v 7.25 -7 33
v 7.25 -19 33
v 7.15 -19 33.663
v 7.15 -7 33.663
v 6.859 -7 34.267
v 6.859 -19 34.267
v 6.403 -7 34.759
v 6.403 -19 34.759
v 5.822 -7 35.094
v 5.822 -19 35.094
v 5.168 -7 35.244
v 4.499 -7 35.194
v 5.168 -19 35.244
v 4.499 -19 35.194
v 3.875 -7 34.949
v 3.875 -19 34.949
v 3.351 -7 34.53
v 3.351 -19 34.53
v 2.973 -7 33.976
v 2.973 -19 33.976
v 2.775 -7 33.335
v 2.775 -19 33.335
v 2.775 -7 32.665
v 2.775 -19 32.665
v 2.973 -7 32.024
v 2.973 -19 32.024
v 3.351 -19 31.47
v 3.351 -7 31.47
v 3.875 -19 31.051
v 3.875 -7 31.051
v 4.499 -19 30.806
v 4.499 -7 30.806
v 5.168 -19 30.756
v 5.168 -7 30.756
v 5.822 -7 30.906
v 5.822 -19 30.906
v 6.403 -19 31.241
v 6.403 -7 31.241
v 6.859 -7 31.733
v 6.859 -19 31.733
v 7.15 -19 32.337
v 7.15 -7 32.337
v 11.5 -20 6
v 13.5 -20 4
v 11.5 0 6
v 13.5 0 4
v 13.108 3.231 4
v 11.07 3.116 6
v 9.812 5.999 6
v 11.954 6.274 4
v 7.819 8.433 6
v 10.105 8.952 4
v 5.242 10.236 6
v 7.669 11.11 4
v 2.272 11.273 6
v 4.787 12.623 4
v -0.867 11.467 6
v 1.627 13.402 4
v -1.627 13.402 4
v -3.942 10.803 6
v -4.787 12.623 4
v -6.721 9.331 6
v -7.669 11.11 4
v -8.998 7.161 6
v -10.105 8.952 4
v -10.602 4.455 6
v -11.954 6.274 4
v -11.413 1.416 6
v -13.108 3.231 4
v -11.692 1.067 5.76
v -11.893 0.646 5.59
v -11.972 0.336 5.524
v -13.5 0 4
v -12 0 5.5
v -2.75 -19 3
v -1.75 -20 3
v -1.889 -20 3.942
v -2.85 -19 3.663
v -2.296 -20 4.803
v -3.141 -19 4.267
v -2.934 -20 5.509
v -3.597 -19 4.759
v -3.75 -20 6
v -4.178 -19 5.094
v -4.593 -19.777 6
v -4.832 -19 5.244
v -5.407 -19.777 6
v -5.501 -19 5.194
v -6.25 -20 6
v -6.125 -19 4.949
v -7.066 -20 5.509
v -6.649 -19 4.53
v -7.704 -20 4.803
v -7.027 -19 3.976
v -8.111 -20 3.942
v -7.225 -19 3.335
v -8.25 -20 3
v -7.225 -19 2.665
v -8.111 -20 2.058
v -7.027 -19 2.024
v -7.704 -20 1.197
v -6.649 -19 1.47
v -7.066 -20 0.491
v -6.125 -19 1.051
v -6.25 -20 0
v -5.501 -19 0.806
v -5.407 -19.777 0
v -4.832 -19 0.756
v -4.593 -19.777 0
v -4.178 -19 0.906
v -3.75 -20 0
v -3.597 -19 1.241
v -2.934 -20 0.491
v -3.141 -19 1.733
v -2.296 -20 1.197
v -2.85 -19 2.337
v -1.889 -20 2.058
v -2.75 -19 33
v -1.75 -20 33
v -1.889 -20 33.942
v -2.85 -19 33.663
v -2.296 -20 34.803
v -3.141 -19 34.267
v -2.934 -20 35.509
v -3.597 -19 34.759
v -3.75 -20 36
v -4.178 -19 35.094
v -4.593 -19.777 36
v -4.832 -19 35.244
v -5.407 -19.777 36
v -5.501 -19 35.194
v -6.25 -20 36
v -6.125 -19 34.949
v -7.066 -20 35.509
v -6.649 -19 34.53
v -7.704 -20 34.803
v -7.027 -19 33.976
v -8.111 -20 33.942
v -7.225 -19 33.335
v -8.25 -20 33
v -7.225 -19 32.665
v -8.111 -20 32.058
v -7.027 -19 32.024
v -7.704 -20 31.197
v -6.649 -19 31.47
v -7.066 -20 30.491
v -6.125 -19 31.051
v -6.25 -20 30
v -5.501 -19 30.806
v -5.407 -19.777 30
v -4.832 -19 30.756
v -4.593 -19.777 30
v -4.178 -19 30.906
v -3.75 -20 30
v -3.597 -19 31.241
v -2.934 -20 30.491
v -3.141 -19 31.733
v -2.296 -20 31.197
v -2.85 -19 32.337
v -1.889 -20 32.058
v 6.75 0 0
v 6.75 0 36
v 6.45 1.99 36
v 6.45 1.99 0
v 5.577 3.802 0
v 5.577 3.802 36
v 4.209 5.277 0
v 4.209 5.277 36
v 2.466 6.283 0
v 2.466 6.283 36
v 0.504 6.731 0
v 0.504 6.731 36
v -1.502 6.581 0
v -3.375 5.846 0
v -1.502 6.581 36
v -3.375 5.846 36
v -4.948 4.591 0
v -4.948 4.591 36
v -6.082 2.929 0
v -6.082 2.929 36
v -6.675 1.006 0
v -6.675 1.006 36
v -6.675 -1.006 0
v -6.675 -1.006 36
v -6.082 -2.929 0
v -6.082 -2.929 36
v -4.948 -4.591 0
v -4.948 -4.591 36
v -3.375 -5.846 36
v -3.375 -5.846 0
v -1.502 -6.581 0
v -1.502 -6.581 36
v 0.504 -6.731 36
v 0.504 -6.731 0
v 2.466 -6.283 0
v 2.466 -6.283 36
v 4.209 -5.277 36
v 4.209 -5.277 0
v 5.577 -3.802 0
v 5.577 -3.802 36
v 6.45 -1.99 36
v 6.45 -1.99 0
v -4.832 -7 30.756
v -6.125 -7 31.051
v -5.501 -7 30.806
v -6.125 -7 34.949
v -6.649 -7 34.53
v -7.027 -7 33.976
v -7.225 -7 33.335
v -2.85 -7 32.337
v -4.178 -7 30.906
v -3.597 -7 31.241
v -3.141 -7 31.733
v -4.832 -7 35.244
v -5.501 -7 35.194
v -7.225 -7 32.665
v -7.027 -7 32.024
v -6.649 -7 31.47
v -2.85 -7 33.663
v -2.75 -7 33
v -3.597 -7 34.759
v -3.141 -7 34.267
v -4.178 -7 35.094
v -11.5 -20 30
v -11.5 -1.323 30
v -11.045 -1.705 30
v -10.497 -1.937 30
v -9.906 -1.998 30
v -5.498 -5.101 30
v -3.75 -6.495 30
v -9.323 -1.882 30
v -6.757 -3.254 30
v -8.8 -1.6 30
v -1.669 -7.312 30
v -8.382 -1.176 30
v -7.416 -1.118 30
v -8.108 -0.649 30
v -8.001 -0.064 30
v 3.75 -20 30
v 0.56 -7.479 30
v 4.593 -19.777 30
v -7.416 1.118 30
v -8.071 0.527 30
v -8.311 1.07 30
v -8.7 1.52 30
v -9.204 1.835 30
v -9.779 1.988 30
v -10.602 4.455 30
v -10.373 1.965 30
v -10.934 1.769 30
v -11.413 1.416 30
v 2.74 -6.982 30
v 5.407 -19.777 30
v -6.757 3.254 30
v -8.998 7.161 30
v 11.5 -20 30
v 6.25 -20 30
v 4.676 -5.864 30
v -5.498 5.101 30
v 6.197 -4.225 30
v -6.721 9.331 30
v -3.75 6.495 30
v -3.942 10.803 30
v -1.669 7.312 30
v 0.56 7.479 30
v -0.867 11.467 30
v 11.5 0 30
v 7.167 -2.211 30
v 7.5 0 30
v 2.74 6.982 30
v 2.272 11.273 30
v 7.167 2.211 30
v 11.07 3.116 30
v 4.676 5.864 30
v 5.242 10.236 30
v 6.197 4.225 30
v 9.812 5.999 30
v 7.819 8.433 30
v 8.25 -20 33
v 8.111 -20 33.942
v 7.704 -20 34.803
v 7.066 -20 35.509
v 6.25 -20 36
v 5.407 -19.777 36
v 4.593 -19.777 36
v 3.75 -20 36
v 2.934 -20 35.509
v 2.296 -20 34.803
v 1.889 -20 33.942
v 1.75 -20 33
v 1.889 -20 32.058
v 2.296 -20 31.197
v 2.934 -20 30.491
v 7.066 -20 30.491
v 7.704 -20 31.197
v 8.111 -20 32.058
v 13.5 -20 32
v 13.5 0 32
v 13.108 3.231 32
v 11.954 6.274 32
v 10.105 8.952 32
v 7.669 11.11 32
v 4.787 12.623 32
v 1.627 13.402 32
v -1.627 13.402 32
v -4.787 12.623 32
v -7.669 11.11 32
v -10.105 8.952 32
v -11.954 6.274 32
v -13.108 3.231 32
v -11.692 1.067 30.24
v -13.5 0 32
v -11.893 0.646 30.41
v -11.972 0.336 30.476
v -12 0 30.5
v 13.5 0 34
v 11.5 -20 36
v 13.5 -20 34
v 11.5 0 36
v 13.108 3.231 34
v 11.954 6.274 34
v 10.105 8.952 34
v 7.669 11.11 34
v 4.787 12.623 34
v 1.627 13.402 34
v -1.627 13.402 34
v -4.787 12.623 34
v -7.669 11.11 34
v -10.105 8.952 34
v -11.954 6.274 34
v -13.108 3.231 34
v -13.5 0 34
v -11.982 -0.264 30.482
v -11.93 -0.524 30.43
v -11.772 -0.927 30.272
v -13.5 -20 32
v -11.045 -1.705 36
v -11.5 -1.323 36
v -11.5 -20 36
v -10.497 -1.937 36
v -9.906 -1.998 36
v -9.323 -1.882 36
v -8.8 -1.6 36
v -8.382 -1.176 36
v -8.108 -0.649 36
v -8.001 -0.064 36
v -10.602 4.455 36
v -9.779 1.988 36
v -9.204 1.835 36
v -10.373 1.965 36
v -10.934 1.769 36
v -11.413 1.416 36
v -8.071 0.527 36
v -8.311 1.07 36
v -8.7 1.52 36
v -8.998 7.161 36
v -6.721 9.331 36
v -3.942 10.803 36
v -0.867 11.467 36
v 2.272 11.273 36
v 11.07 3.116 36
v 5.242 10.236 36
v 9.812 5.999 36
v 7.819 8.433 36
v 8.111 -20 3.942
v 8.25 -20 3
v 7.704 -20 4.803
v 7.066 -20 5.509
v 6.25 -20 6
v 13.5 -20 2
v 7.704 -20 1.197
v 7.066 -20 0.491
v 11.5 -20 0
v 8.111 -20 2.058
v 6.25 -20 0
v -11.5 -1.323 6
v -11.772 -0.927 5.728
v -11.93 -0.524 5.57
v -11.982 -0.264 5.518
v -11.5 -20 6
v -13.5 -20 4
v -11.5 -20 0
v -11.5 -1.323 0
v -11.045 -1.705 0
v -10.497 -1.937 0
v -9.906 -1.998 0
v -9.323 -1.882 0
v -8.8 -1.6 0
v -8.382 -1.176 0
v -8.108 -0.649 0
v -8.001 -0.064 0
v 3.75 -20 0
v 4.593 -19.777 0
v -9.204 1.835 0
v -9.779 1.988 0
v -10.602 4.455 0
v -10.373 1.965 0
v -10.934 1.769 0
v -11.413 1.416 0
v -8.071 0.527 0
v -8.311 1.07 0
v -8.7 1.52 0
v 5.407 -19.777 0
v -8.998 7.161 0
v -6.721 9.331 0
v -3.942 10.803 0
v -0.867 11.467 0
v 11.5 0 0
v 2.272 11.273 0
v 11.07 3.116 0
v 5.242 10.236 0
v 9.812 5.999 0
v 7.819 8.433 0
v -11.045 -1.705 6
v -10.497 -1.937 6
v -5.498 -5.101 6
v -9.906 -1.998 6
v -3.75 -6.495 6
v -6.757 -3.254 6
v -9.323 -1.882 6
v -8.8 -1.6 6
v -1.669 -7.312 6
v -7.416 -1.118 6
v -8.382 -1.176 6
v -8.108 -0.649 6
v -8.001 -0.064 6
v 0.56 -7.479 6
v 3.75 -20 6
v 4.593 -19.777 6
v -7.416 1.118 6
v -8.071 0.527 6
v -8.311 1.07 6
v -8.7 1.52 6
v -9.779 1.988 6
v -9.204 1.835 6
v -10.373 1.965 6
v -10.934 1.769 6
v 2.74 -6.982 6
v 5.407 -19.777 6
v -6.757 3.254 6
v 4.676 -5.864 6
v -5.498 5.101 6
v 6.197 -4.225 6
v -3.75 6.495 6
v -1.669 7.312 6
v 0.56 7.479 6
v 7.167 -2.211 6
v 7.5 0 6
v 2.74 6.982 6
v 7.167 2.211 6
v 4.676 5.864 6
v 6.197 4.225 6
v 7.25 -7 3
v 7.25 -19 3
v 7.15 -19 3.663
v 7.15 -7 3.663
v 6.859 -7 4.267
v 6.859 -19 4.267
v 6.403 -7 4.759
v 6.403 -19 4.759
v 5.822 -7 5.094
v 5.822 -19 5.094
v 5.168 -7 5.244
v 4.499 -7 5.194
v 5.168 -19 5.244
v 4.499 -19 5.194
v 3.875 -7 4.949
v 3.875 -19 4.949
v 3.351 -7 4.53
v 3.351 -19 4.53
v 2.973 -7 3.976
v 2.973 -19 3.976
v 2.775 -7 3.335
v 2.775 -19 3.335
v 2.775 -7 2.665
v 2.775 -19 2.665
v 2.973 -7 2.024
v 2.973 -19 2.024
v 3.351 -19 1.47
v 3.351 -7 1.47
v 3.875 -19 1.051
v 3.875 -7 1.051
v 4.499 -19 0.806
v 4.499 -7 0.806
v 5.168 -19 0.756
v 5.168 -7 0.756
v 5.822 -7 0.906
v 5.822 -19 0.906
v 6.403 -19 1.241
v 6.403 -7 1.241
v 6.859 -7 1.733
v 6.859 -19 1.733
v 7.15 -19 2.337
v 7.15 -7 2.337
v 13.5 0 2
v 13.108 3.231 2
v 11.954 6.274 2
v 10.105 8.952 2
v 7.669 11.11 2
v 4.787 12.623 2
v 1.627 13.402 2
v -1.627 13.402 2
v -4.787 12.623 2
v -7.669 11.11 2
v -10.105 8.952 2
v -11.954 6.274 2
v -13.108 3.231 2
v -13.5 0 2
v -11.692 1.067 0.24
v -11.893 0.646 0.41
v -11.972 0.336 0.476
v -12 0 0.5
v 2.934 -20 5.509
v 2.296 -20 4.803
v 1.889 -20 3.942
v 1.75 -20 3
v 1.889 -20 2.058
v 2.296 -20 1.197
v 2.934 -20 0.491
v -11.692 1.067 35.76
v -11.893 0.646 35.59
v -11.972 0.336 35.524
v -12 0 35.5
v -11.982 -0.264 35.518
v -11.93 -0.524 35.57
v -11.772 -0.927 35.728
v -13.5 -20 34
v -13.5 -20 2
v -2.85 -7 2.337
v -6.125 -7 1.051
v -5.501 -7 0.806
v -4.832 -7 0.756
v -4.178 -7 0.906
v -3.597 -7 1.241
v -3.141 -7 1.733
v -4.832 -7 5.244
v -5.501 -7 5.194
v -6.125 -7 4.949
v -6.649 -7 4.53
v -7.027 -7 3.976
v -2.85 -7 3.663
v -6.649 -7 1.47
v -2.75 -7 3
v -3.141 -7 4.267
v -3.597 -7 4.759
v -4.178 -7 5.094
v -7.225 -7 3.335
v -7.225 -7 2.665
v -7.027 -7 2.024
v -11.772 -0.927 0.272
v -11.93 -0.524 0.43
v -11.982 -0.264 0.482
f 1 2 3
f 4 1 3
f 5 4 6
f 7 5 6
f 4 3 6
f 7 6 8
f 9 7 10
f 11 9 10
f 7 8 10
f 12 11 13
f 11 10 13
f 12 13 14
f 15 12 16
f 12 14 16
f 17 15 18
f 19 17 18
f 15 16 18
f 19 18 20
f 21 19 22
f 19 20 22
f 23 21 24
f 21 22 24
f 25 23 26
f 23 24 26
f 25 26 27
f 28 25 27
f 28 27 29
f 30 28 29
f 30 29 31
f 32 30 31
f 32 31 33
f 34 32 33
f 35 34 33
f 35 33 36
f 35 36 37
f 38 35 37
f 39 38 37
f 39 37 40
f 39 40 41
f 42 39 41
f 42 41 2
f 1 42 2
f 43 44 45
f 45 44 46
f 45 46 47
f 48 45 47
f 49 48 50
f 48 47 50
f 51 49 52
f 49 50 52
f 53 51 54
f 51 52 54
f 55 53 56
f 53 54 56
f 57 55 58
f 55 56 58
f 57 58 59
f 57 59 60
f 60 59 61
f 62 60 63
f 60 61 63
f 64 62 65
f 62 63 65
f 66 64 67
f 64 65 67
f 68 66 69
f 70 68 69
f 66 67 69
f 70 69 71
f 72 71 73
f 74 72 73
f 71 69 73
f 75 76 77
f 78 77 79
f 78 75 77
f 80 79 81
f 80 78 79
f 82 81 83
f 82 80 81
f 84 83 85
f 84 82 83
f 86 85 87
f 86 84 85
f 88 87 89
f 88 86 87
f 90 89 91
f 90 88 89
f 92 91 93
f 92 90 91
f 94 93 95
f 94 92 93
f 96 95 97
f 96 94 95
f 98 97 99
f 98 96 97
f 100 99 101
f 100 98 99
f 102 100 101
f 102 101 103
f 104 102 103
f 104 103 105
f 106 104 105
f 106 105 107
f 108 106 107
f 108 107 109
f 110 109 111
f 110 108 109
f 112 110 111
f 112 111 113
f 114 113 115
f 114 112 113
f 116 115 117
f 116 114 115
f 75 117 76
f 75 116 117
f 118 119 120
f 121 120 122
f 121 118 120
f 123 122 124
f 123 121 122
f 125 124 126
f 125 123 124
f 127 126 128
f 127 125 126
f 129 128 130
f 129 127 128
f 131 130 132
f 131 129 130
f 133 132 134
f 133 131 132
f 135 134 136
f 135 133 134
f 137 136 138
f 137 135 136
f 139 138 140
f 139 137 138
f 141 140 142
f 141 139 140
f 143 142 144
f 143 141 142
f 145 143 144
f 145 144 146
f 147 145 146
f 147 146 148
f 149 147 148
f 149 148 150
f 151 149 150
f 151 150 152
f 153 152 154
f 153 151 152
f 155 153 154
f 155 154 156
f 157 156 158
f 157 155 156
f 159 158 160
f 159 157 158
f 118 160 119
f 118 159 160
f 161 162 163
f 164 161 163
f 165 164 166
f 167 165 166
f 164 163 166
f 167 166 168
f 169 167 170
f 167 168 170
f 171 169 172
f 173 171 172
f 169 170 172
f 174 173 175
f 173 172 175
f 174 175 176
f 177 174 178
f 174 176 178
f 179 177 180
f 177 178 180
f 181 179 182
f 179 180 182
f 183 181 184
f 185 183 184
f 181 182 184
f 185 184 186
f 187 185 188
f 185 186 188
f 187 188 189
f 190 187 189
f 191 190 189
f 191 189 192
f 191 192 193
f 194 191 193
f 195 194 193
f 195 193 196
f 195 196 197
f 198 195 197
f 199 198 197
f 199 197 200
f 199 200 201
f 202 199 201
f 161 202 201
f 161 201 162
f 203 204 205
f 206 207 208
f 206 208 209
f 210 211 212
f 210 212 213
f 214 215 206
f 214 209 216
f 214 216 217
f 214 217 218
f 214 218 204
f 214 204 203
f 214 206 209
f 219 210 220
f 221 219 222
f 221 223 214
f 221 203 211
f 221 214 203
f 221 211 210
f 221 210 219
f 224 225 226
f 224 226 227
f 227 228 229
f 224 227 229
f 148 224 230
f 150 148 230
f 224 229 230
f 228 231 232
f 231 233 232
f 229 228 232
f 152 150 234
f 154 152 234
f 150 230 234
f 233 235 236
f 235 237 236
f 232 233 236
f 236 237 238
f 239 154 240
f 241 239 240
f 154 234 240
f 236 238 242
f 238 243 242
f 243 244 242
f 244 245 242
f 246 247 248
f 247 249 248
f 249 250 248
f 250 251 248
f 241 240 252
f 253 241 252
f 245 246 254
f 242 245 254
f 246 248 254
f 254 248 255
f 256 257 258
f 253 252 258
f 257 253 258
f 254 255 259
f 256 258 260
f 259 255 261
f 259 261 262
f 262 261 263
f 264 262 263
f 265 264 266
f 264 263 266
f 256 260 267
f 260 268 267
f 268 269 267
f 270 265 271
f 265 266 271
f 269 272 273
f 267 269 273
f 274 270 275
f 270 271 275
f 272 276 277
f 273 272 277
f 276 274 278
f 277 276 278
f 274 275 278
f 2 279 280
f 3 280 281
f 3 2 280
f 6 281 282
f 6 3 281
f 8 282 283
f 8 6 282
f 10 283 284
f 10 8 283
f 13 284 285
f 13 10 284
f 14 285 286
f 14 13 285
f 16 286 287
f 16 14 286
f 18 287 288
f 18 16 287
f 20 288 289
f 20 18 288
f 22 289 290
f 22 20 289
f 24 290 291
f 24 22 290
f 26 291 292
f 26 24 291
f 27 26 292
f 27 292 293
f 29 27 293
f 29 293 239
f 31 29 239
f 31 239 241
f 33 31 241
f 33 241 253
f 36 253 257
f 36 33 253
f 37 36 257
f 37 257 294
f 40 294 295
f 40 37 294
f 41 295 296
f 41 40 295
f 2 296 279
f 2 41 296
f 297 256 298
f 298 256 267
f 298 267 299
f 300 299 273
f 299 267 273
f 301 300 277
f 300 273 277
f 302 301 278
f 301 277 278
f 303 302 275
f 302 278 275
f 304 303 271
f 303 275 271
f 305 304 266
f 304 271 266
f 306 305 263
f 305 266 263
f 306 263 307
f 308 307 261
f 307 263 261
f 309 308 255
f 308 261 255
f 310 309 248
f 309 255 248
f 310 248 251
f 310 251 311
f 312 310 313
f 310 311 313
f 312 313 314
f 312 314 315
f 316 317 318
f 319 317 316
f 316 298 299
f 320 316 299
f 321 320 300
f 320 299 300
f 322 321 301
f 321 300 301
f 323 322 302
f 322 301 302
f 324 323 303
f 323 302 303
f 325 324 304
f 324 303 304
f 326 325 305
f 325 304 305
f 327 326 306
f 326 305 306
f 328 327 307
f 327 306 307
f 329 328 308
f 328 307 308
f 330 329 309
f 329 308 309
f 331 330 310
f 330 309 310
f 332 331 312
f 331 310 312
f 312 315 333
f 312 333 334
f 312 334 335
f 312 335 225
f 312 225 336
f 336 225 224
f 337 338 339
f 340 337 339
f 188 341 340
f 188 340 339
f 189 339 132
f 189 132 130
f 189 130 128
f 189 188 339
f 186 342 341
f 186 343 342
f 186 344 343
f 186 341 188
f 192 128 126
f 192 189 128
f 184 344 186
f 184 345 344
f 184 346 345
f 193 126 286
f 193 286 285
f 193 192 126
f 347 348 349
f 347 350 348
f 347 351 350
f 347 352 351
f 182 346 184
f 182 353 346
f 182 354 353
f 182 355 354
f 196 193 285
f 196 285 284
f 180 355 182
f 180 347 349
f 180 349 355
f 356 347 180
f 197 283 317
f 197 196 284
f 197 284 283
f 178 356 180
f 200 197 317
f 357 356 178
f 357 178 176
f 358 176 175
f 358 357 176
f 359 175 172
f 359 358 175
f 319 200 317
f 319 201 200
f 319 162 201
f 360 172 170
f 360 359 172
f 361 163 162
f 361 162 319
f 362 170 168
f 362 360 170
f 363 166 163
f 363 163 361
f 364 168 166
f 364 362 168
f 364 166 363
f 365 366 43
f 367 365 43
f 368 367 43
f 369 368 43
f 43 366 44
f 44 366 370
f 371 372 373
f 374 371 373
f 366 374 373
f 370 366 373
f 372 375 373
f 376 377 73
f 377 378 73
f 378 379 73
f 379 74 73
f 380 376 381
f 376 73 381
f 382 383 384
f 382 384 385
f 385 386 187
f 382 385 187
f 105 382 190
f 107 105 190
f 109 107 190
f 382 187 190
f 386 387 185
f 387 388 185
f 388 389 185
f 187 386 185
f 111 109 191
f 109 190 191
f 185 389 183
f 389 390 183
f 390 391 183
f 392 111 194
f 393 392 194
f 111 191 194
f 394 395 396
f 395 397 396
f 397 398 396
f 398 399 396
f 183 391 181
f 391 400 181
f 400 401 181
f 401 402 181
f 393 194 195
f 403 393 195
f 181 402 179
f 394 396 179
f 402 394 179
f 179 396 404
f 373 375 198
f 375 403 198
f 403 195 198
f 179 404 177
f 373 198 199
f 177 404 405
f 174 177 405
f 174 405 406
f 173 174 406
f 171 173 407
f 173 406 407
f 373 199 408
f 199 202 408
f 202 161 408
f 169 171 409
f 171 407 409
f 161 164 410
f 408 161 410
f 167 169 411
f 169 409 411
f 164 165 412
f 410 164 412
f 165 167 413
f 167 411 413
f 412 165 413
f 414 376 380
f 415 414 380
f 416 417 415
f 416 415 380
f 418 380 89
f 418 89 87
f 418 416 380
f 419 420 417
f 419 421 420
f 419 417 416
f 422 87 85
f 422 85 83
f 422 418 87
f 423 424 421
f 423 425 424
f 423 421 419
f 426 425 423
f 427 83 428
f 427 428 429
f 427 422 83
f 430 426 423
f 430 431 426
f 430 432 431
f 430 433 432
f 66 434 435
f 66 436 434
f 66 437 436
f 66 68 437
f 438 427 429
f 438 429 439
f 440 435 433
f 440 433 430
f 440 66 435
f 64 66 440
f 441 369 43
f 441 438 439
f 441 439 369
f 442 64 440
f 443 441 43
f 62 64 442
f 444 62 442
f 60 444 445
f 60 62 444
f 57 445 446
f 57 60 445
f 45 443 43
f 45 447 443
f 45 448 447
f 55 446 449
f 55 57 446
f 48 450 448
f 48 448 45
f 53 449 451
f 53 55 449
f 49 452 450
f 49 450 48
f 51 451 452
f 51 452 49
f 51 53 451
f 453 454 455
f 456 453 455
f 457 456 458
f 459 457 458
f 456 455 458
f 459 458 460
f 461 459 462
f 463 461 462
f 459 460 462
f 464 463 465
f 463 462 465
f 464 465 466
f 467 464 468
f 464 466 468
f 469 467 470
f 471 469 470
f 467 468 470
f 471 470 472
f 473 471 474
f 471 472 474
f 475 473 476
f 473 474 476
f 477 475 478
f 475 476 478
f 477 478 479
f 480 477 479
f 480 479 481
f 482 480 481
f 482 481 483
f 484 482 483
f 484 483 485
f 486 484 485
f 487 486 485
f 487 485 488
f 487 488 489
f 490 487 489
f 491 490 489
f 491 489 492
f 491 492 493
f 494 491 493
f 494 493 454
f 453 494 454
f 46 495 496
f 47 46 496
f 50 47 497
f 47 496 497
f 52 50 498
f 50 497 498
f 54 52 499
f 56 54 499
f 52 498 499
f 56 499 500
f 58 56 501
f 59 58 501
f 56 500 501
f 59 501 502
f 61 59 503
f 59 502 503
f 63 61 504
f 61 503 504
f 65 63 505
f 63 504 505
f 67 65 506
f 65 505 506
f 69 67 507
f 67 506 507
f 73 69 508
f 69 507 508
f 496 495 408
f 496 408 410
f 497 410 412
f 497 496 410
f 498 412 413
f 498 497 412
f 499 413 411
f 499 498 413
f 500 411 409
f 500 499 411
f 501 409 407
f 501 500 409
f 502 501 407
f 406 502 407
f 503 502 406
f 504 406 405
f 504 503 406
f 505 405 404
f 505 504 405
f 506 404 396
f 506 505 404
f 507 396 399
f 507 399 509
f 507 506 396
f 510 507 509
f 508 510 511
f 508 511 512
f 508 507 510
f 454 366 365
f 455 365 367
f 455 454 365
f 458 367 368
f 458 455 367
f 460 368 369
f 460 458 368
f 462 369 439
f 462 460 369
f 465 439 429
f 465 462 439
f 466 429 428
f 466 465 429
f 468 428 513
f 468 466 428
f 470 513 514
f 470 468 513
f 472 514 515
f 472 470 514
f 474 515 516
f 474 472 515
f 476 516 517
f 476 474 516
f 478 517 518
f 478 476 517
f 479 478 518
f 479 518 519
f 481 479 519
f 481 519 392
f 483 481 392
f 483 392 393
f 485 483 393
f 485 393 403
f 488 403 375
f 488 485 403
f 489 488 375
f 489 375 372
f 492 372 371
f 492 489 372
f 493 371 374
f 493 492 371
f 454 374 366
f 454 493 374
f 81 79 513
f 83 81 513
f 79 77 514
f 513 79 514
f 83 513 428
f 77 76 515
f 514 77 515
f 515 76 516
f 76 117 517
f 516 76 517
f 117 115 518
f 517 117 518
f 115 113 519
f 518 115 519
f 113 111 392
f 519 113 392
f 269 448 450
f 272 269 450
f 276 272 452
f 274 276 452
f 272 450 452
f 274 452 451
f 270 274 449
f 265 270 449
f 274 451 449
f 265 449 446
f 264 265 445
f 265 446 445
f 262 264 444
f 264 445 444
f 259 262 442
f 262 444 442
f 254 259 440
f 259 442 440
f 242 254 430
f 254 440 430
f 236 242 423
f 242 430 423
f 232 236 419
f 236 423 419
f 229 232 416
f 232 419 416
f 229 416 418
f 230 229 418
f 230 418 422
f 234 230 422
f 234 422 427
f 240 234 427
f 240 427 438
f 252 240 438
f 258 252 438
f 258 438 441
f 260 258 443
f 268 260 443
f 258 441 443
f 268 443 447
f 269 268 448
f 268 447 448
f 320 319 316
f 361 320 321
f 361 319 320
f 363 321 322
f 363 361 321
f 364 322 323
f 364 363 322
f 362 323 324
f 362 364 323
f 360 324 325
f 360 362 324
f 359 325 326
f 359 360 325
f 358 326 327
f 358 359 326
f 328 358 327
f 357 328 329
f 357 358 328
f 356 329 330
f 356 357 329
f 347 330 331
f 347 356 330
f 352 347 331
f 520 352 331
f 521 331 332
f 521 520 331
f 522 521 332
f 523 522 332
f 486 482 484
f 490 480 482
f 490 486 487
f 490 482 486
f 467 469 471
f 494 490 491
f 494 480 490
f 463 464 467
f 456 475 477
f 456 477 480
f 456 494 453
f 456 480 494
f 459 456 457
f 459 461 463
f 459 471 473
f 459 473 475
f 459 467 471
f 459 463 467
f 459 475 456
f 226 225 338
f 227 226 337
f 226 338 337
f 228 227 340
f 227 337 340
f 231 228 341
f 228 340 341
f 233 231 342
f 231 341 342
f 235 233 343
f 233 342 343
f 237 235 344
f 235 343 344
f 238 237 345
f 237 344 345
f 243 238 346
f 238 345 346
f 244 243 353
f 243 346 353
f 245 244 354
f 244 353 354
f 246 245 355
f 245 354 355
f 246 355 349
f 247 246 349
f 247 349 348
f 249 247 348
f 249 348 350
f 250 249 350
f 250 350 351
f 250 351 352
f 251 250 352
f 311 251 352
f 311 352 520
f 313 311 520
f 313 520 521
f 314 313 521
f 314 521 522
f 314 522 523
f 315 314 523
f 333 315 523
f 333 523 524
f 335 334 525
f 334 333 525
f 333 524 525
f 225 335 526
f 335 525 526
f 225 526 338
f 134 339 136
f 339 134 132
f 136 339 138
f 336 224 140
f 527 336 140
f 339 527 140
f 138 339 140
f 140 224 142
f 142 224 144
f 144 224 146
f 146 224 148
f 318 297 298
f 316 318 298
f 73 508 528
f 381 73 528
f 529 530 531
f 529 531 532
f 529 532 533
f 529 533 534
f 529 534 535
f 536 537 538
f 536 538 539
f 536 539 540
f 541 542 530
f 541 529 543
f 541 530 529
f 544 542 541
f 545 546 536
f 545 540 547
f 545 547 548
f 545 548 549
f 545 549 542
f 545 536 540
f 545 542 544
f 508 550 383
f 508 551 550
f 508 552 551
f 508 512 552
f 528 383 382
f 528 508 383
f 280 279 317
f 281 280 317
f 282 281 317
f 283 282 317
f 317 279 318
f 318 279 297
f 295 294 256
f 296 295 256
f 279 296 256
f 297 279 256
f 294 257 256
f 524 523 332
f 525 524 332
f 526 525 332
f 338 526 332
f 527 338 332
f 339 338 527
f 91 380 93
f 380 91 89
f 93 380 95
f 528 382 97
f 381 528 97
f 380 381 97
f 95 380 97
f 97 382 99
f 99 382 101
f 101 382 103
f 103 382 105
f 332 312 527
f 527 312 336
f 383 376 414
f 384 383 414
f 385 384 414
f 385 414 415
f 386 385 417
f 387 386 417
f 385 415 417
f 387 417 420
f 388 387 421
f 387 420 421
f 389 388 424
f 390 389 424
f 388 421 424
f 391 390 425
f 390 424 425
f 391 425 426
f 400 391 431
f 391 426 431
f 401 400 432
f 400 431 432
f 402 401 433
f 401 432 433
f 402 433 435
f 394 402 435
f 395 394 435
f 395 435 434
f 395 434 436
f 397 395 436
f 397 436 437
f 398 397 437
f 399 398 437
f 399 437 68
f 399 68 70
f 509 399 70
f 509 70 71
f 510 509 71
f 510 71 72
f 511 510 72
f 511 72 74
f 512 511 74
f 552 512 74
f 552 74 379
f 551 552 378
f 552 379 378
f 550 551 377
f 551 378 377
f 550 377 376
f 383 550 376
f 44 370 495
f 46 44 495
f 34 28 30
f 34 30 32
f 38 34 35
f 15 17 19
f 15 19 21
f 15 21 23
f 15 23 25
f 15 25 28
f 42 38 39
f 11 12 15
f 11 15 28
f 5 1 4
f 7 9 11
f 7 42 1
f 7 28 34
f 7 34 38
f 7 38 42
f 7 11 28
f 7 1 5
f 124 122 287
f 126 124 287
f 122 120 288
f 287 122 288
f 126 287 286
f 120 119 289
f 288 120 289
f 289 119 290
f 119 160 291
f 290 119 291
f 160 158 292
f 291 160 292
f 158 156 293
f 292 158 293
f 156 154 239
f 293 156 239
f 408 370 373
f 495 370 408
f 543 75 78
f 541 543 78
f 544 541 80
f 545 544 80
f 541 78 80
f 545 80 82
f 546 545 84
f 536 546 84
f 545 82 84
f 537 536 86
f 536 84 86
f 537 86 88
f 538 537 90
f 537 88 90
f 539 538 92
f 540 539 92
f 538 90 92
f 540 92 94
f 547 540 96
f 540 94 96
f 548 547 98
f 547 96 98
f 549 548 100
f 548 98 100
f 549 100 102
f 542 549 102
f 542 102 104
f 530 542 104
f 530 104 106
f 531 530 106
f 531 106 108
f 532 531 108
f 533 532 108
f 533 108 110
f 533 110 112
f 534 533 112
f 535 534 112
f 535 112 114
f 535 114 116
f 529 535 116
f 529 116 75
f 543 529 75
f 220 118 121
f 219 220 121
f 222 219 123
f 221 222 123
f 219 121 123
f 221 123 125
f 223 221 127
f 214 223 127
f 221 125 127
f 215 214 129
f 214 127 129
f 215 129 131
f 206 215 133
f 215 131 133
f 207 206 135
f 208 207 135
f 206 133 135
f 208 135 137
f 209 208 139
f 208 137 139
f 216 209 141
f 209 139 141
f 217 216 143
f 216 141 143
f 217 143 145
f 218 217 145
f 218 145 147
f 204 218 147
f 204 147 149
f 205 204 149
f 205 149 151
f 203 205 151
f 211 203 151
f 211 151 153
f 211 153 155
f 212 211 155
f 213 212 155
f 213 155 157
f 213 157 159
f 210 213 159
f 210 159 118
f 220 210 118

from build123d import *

# Parameters (mm, degrees)
BOSS_EXTRUDE1_DEPTH = 6
SKETCH2_R           = 7.5
BOSS_EXTRUDE2_DEPTH = 24
BOSS_EXTRUDE3_DEPTH = 6
SKETCH4_R           = 6.75
CUT_EXTRUDE1_DEPTH  = 44.338781709
SKETCH5_R           = 2.25
CUT_EXTRUDE2_DEPTH  = 13
CHAMFER1_SIZE       = 1
CHAMFER2_SIZE       = 2
SKETCH6_R           = 2
CUT_EXTRUDE3_DEPTH  = 44.338781709


with BuildPart() as part:
    # Sketch1 → Boss-Extrude1 (new body)
    with BuildSketch(Plane.XY):
        with BuildLine():
            Line((-13.5, 0), (-13.5, -20))
            Line((-13.5, -20), (13.5, -20))
            Line((13.5, -20), (13.5, 0))
            ThreePointArc((13.5, 0), (0, 13.5), (-13.5, 0))
        make_face()
    extrude(amount=BOSS_EXTRUDE1_DEPTH)

    # Sketch2 → Boss-Extrude2 (add)
    with BuildSketch(Plane.XY.offset(6)):
        Circle(SKETCH2_R)
    extrude(amount=BOSS_EXTRUDE2_DEPTH)

    # Sketch3 → Boss-Extrude3 (add)
    with BuildSketch(Plane.XY.offset(30)):
        with BuildLine():
            Line((-13.5, 0), (-13.5, -20))
            Line((-13.5, -20), (13.5, -20))
            Line((13.5, -20), (13.5, 0))
            ThreePointArc((13.5, 0), (0, 13.5), (-13.5, 0))
        make_face()
    extrude(amount=BOSS_EXTRUDE3_DEPTH)

    # Sketch4 → Cut-Extrude1 (cut, through all)
    with BuildSketch(Plane.XY.offset(36)):
        Circle(SKETCH4_R)
    extrude(amount=-CUT_EXTRUDE1_DEPTH, mode=Mode.SUBTRACT)

    # Sketch5 → Cut-Extrude2 (cut)
    with BuildSketch(Plane.XZ.offset(20)):
        with Locations((-5, 33)):
            Circle(SKETCH5_R)
        with Locations((5, 33)):
            Circle(SKETCH5_R)
        with Locations((-5, 3)):
            Circle(SKETCH5_R)
        with Locations((5, 3)):
            Circle(SKETCH5_R)
    extrude(amount=-CUT_EXTRUDE2_DEPTH, mode=Mode.SUBTRACT)

    # Chamfer1
    # the kernel refuses this chamfer: 1 mm, written as the material it takes off along each edge
    with BuildSketch(Plane(origin=(5, -20, 33), x_dir=(1, 0, 0), z_dir=(0, 0, -1))) as chamfer1_piece_1:
        Polygon((2.25 + CHAMFER1_SIZE, 0), (2.25, -CHAMFER1_SIZE), (2.25, 0), align=None)
    revolve(axis=Axis((5, -20, 33), (0, -1, 0)), mode=Mode.SUBTRACT)
    with BuildSketch(Plane(origin=(-5, -20, 3), x_dir=(1, 0, 0), z_dir=(0, 0, -1))) as chamfer1_piece_2:
        Polygon((2.25 + CHAMFER1_SIZE, 0), (2.25, -CHAMFER1_SIZE), (2.25, 0), align=None)
    revolve(axis=Axis((-5, -20, 3), (0, -1, 0)), mode=Mode.SUBTRACT)
    with BuildSketch(Plane(origin=(5, -20, 3), x_dir=(1, 0, 0), z_dir=(0, 0, -1))) as chamfer1_piece_3:
        Polygon((2.25 + CHAMFER1_SIZE, 0), (2.25, -CHAMFER1_SIZE), (2.25, 0), align=None)
    revolve(axis=Axis((5, -20, 3), (0, -1, 0)), mode=Mode.SUBTRACT)
    with BuildSketch(Plane(origin=(-5, -20, 33), x_dir=(1, 0, 0), z_dir=(0, 0, -1))) as chamfer1_piece_4:
        Polygon((2.25 + CHAMFER1_SIZE, 0), (2.25, -CHAMFER1_SIZE), (2.25, 0), align=None)
    revolve(axis=Axis((-5, -20, 33), (0, -1, 0)), mode=Mode.SUBTRACT)

    # Chamfer2
    chamfer2_edges = [part.edges().sort_by_distance(p)[0] for p in [
        (13.5, -10, 6),
        (0, 13.5, 30),
        (-13.5, -10, 30),
        (13.5, -10, 30),
        (0, 13.5, 36),
        (-13.5, -10, 36),
        (13.5, -10, 36),
        (0, 13.5, 6),
        (13.5, -10, 0),
        (-13.5, -10, 0),
        (0, 13.5, 0),
        (-13.5, -10, 6),
    ]]
    chamfer(chamfer2_edges, length=CHAMFER2_SIZE)

    # Sketch6 → Cut-Extrude3 (cut, through all)
    with BuildSketch(Plane.XY.offset(36)):
        with Locations(Location((-10, 0, 0), (0, 0, 221.409622109))):
            Circle(SKETCH6_R)
    extrude(amount=-CUT_EXTRUDE3_DEPTH, mode=Mode.SUBTRACT)


solid = part.part
